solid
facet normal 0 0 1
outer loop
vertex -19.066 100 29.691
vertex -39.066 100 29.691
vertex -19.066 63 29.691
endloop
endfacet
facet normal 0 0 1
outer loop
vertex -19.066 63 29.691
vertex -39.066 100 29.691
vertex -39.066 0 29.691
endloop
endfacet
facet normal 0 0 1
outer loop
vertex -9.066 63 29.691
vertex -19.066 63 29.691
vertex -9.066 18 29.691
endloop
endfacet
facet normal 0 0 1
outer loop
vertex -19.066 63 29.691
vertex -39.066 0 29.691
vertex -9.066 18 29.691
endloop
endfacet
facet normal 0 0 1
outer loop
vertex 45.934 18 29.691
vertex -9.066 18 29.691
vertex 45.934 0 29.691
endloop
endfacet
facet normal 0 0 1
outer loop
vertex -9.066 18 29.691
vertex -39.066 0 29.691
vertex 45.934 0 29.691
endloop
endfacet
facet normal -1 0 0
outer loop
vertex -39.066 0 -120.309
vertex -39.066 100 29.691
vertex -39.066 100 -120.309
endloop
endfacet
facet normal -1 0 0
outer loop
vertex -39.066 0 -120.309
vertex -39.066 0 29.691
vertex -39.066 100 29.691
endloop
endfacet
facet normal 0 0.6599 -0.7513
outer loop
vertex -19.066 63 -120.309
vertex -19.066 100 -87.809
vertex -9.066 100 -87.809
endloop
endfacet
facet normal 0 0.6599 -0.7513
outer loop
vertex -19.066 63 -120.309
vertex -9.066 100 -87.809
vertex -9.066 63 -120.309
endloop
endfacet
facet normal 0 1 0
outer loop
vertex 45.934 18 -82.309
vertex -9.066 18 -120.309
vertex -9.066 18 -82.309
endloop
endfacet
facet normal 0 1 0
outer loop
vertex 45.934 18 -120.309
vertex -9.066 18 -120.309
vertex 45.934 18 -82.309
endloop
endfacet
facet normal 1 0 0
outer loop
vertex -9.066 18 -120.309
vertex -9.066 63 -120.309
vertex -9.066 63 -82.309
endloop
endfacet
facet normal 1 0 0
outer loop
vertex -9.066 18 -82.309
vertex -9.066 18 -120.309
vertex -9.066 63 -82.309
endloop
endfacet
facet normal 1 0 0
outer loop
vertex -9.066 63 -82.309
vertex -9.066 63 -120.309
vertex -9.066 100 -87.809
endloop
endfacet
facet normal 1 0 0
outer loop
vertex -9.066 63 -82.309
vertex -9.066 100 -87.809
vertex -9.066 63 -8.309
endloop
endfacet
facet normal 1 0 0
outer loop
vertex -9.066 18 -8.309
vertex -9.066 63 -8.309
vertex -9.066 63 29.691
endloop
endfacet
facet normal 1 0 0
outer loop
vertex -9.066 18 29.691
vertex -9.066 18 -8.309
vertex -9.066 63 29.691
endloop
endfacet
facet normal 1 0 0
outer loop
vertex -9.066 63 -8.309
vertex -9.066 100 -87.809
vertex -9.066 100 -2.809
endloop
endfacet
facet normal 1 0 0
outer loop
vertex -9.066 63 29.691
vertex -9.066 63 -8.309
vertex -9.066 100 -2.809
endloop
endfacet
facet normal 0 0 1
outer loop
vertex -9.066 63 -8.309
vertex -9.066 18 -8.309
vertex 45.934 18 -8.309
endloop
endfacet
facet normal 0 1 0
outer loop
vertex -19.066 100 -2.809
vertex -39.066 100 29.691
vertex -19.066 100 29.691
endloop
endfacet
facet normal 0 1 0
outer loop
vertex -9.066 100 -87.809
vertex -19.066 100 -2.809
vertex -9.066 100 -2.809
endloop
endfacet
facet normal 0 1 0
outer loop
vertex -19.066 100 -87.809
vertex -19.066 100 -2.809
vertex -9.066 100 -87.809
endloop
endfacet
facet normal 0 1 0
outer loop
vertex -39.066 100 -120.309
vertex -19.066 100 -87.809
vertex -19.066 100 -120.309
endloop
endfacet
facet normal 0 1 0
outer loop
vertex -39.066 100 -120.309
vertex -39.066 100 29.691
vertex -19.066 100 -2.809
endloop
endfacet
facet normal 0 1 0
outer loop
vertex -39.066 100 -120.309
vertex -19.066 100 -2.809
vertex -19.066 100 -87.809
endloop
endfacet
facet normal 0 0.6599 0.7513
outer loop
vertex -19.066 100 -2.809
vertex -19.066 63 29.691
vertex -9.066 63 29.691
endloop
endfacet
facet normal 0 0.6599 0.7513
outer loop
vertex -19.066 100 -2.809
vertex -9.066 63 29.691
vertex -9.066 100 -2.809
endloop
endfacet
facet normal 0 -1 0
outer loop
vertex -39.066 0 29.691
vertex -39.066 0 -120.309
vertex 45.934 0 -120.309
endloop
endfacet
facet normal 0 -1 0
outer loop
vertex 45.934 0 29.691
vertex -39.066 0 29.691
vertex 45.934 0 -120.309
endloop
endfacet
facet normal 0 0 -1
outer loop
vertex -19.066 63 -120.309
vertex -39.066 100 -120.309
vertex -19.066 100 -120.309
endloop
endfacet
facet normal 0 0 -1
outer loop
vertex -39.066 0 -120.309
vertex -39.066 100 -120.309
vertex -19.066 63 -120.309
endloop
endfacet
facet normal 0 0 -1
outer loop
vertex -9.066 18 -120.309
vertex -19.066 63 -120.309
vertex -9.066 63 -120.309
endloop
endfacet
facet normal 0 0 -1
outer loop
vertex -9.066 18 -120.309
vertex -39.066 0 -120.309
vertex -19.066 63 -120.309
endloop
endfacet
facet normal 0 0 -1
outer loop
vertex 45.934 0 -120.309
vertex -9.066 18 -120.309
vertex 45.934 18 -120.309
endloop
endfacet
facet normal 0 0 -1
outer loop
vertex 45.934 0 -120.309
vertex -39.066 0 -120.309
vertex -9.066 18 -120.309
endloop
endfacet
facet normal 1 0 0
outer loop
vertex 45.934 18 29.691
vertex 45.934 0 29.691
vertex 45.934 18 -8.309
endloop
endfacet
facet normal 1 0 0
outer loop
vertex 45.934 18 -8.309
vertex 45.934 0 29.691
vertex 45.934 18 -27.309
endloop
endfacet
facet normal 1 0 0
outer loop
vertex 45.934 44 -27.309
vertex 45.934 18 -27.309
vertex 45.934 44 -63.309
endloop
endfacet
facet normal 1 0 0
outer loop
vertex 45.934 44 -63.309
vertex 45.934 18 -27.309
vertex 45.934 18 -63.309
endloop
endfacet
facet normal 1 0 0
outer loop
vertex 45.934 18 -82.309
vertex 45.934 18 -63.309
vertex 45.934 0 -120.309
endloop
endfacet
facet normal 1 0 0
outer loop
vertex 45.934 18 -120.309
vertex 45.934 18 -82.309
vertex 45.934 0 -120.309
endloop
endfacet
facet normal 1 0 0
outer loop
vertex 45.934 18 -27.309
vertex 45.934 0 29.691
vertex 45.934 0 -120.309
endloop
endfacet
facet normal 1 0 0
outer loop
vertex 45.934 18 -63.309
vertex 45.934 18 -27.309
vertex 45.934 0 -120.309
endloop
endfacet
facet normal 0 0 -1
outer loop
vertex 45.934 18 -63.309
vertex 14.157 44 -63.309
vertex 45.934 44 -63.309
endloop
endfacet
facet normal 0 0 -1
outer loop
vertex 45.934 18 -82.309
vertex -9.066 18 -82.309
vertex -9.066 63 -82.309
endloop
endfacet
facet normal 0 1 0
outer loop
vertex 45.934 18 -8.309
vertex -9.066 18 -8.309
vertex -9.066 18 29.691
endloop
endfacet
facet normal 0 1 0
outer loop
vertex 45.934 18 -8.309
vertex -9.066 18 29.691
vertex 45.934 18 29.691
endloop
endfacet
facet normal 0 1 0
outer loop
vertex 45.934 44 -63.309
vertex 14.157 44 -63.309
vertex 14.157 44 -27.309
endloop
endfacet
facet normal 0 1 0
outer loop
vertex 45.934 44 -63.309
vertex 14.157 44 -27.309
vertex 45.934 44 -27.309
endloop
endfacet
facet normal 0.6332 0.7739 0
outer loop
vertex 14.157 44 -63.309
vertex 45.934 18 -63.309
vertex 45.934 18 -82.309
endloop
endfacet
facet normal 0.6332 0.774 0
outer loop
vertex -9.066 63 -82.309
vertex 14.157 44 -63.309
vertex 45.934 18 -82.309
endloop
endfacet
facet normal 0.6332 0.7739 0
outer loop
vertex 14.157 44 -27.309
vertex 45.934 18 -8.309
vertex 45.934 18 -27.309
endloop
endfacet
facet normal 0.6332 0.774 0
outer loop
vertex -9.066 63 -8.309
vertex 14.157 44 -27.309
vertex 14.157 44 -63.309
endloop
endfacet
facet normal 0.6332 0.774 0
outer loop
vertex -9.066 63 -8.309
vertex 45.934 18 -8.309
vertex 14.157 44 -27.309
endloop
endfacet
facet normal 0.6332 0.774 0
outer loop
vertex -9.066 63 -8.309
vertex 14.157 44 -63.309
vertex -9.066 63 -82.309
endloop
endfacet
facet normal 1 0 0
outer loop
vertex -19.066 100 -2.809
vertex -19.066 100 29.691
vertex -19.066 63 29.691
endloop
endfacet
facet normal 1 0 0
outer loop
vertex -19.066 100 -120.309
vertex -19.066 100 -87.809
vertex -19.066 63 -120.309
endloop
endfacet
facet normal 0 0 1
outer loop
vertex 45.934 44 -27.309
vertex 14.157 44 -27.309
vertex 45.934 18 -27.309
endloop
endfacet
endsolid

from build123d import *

# Parameters (mm, degrees)
SKETCH1_W           = 85
SKETCH1_H           = 150
BOSS_EXTRUDE1_DEPTH = 18
SKETCH2_W           = 30
SKETCH2_H           = 150
BOSS_EXTRUDE2_DEPTH = 82
SKETCH3_W           = 55
SKETCH3_H           = 74
BOSS_EXTRUDE3_DEPTH = 45
CUT_EXTRUDE1_DEPTH  = 74
SKETCH5_W           = 85
SKETCH5_H           = 36
BOSS_EXTRUDE4_DEPTH = 26
SKETCH7_W           = 150
SKETCH7_H           = 37
CUT_EXTRUDE2_DEPTH  = 10
BOSS_EXTRUDE5_DEPTH = 10


with BuildPart() as part:
    # Sketch1 → Boss-Extrude1 (new body)
    with BuildSketch(Plane(origin=(0, 0, 0), x_dir=(1, 0, 0), z_dir=(0, 1, 0))):
        with Locations((3.434439448, 45.309233449)):
            Rectangle(SKETCH1_W, SKETCH1_H)
    extrude(amount=BOSS_EXTRUDE1_DEPTH)

    # Sketch2 → Boss-Extrude2 (add)
    with BuildSketch(Plane(origin=(0, 18, 0), x_dir=(1, 0, 0), z_dir=(0, 1, 0))):
        with Locations((-24.065560552, 45.309233449)):
            Rectangle(SKETCH2_W, SKETCH2_H)
    extrude(amount=BOSS_EXTRUDE2_DEPTH)

    # Sketch3 → Boss-Extrude3 (add)
    with BuildSketch(Plane(origin=(0, 18, 0), x_dir=(1, 0, 0), z_dir=(0, 1, 0))):
        with Locations((18.434439448, 45.309233449)):
            Rectangle(SKETCH3_W, SKETCH3_H)
    extrude(amount=BOSS_EXTRUDE3_DEPTH)

    # Sketch4 → Cut-Extrude1 (cut)
    with BuildSketch(Plane.XY.offset(-8.309233449)):
        Polygon((45.934439448, 18), (-9.065560552, 63), (45.934439448, 63), align=None)
    extrude(amount=-CUT_EXTRUDE1_DEPTH, mode=Mode.SUBTRACT)

    # Sketch5 → Boss-Extrude4 (add)
    with BuildSketch(Plane(origin=(0, 18, 0), x_dir=(1, 0, 0), z_dir=(0, 1, 0))):
        with Locations((3.434439448, 45.309233449)):
            Rectangle(SKETCH5_W, SKETCH5_H)
    extrude(amount=BOSS_EXTRUDE4_DEPTH)

    # Sketch7 → Cut-Extrude2 (cut)
    with BuildSketch(Plane(origin=(-9.065560552, 0, 0), x_dir=(0, 0, -1), z_dir=(1, 0, 0))):
        with Locations((45.309233449, 81.5)):
            Rectangle(SKETCH7_W, SKETCH7_H)
    extrude(amount=-CUT_EXTRUDE2_DEPTH, mode=Mode.SUBTRACT)

    # Sketch8 → Boss-Extrude5 (add)
    with BuildSketch(Plane(origin=(-19.065560552, 0, 0), x_dir=(0, 0, -1), z_dir=(1, 0, 0))):
        Polygon((2.809233449, 100), (87.809233449, 100), (120.309233449, 63), (-29.690766551, 63), align=None)
    extrude(amount=BOSS_EXTRUDE5_DEPTH)


solid = part.part
